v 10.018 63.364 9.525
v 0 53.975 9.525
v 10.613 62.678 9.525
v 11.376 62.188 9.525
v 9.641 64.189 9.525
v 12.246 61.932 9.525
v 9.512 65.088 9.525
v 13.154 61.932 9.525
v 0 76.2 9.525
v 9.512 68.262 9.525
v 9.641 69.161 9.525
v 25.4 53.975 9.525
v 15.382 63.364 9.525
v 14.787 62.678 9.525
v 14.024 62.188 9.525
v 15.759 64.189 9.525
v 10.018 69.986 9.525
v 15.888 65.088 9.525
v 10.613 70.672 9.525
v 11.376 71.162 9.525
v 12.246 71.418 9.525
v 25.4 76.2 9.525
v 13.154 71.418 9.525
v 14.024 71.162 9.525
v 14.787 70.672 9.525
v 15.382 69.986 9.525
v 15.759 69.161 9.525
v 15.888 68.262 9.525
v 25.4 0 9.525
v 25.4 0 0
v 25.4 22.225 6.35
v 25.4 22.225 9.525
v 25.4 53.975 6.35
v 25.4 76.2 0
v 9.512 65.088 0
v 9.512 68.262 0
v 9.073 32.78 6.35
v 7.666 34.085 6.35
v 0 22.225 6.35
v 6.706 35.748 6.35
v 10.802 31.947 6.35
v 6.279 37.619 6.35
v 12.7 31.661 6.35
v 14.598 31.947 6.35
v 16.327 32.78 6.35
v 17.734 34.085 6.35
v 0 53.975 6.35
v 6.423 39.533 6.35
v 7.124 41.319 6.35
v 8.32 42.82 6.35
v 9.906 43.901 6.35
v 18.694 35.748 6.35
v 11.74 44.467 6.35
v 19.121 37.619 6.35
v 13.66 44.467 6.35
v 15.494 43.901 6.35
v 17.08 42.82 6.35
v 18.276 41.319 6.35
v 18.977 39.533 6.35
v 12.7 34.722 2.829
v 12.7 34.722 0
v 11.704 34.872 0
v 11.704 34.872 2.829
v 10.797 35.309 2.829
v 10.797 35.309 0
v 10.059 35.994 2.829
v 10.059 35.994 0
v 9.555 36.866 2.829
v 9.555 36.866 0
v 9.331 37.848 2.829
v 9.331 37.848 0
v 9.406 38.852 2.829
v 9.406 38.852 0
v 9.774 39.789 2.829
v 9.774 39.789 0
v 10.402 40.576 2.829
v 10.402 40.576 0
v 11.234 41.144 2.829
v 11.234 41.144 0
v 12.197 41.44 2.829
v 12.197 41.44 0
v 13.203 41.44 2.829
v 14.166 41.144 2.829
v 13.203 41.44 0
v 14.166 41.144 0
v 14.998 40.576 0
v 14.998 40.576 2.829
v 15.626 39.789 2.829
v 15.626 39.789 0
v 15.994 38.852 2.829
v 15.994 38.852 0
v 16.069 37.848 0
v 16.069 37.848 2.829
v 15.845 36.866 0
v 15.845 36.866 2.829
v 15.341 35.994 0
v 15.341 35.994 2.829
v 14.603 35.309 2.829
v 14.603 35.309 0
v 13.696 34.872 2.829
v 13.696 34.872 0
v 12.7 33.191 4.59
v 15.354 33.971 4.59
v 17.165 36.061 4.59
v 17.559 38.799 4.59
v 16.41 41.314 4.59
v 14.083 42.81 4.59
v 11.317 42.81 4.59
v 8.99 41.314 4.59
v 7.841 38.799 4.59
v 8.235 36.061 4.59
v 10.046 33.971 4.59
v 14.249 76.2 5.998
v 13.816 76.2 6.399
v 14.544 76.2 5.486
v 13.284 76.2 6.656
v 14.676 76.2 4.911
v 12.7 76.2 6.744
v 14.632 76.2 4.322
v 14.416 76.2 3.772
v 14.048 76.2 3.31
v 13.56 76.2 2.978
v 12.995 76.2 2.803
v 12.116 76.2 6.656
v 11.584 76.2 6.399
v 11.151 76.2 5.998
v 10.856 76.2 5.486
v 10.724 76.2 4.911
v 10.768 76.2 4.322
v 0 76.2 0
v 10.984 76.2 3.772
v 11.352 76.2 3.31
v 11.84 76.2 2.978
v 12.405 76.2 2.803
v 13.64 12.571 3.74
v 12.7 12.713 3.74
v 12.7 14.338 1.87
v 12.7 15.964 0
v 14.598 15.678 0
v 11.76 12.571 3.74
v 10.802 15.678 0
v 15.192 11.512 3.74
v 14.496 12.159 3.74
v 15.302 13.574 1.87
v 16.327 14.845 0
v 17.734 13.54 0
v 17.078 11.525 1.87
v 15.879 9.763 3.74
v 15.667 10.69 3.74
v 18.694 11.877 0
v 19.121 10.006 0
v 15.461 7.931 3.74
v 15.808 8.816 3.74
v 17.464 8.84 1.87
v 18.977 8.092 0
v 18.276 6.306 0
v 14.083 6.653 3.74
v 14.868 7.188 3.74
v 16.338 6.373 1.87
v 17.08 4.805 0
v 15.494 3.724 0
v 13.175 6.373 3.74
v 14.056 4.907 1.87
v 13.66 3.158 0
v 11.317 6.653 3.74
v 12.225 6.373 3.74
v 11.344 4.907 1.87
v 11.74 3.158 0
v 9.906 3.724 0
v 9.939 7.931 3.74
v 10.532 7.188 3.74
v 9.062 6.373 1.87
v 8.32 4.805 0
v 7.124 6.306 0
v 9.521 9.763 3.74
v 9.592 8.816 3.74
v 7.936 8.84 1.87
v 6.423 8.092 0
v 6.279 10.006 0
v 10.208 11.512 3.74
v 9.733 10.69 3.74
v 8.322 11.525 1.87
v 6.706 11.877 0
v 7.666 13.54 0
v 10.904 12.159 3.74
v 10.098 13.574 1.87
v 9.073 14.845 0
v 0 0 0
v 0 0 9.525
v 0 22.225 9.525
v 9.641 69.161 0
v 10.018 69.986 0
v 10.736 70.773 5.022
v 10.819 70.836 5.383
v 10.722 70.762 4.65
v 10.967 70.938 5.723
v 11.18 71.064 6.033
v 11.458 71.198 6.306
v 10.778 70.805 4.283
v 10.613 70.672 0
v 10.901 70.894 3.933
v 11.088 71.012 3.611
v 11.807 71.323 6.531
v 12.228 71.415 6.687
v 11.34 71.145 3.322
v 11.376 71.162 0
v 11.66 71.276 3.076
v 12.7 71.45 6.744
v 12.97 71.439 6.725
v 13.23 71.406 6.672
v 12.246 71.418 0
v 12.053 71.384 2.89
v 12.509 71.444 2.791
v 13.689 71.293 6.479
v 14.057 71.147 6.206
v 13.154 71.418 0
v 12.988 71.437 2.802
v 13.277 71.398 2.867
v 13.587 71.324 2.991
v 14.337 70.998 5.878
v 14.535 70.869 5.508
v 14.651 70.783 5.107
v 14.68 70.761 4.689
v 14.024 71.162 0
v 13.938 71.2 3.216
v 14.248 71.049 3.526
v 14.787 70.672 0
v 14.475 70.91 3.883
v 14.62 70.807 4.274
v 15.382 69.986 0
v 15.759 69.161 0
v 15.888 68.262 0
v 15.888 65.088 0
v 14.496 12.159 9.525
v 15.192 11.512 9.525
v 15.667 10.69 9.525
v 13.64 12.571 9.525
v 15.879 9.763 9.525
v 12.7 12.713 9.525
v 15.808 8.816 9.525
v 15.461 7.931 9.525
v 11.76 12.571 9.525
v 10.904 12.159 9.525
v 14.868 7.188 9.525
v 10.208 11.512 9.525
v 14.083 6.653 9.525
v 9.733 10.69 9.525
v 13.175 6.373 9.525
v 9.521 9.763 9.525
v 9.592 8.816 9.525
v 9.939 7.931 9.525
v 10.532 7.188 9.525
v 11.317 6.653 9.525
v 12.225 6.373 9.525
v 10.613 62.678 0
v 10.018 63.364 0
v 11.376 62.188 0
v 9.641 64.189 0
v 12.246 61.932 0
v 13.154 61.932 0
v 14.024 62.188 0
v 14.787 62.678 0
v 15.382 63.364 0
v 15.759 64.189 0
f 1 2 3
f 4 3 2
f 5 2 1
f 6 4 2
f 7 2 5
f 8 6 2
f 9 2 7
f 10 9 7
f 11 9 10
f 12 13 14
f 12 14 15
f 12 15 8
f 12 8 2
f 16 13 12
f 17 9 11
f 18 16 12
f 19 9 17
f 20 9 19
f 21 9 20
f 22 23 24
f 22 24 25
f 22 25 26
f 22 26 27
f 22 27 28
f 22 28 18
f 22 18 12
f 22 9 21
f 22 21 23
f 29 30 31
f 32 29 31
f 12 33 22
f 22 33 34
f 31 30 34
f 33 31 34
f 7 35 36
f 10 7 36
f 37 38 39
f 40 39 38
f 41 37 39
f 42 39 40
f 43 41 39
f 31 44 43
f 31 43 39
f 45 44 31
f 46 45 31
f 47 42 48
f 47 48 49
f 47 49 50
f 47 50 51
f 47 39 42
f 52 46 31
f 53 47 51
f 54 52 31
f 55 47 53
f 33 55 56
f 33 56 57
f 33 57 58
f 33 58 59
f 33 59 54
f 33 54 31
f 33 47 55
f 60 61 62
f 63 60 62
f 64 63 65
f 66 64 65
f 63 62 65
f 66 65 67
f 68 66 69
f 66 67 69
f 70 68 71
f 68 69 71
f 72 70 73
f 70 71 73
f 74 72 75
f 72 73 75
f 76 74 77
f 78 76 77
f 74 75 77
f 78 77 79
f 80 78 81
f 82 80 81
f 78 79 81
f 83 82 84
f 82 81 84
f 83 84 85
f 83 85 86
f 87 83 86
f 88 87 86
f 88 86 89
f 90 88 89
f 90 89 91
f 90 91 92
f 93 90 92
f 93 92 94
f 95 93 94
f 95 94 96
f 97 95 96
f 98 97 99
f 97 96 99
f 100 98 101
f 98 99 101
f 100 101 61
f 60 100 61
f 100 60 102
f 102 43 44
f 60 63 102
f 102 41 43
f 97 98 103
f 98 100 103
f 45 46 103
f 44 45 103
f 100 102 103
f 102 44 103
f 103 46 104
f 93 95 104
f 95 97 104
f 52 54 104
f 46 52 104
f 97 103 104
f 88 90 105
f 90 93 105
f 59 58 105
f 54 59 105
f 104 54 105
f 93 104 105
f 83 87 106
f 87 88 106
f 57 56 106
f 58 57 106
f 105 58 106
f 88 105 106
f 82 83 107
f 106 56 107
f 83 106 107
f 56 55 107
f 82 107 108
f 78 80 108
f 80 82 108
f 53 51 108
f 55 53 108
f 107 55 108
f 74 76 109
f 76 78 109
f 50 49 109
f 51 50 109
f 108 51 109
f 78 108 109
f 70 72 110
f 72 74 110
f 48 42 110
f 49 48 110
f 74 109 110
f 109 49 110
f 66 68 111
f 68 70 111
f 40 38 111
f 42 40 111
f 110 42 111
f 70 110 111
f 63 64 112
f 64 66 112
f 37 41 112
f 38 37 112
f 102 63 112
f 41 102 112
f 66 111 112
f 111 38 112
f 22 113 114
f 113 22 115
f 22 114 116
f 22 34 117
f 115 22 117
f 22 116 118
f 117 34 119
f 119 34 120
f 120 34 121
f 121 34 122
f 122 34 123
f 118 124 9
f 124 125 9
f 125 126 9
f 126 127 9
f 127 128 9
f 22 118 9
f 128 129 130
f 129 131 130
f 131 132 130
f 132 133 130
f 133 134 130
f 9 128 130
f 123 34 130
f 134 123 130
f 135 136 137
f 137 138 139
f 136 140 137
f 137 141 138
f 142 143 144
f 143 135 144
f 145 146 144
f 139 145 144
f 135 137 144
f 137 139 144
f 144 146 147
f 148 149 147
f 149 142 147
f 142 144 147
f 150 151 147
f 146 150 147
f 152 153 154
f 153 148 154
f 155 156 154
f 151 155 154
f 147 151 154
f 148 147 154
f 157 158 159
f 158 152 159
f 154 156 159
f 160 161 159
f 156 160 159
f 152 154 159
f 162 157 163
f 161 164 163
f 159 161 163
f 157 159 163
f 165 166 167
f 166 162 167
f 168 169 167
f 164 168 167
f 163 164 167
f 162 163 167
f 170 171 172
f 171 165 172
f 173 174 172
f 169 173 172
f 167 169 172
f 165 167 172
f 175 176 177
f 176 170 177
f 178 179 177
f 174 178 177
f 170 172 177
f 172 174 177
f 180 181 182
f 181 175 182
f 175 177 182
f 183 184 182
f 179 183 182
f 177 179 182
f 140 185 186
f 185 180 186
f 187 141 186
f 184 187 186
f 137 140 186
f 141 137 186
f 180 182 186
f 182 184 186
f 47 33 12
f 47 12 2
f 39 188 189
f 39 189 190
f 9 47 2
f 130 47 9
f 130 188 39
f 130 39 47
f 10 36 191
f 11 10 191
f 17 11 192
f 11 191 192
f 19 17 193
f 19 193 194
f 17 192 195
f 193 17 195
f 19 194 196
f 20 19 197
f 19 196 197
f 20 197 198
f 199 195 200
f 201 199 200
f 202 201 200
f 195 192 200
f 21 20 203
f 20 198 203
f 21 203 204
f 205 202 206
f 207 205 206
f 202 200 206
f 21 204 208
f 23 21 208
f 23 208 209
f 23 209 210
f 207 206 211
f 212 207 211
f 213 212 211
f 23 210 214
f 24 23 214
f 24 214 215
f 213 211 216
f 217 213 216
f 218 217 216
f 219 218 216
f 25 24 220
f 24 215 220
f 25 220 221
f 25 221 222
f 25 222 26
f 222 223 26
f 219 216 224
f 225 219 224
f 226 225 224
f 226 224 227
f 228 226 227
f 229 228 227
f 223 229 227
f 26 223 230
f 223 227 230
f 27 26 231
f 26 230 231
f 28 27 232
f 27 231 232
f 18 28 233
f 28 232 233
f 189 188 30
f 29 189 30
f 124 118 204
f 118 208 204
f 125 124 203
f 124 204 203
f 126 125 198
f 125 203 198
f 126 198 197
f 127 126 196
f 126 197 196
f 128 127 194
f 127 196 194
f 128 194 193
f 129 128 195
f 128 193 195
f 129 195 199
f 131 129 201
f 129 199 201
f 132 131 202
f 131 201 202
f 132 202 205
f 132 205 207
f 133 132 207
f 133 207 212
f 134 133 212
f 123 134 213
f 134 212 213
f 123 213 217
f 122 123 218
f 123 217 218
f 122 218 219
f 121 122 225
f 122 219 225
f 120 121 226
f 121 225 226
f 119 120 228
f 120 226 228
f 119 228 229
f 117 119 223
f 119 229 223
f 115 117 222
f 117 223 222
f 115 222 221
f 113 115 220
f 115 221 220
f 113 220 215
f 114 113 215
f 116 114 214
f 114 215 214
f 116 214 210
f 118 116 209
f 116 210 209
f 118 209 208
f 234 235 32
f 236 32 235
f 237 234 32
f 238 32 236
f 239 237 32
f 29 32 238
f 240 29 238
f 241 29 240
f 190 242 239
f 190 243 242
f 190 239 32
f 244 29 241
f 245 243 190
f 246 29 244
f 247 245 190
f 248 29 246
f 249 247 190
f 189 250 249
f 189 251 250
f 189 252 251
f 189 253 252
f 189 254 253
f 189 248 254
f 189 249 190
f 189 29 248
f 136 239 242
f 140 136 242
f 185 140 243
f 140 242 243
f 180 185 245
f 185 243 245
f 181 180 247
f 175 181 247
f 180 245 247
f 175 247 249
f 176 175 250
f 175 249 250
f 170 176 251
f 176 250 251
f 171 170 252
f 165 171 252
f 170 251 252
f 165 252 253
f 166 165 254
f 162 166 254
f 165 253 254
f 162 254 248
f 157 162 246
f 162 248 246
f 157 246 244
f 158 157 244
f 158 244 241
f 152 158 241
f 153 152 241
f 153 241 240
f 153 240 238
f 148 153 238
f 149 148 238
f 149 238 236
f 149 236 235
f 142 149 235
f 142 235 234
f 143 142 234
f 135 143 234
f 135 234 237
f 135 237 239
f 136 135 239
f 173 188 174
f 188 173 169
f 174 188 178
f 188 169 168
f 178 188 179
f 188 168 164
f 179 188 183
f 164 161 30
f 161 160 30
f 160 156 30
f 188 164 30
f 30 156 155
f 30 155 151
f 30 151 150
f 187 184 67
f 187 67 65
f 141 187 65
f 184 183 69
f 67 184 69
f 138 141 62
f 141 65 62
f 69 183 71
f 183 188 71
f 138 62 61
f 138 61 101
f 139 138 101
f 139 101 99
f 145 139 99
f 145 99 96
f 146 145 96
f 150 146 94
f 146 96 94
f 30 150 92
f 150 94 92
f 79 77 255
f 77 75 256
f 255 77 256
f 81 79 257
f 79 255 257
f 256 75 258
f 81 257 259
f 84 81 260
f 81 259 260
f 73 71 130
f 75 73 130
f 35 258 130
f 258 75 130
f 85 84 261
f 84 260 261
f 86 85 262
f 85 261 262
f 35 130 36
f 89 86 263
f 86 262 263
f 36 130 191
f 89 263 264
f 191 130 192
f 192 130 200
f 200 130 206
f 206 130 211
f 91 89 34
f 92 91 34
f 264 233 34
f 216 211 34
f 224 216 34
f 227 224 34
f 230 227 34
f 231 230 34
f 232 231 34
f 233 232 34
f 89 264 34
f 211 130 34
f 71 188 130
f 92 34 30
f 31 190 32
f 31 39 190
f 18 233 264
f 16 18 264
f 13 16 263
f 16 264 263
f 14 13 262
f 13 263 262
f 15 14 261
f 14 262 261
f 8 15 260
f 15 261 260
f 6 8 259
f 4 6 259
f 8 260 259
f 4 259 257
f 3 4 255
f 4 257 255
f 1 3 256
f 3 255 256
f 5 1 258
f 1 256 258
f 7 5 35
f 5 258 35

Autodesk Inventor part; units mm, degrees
ref_plane "YZ Plane" through (0, 0, 0) normal (1, 0, 0) x (0, 1, 0)
ref_plane "XY Plane" through (0, 0, 0) normal (0, 0, 1) x (1, 0, 0)
sketch "Sketch1" plane through (0, 0, 0) normal (0, 0, 1) x (1, 0, 0)
  line L0 (0, 0) -> (25.4, 0)
  line L1 (25.4, 0) -> (25.4, 76.2)
  line L2 (25.4, 76.2) -> (0, 76.2)
  line L3 (0, 76.2) -> (0, 0)
  dimension "d0" = 76.2
  dimension "d1" = 25.4
extrude "Extrusion1" add sketch "Sketch1" along normal blind 6.35
sketch "Sketch2" plane through (0, 0, 6.35) normal (0, 0, 1) x (1, 0, 0)
  line L0 (25.4, 76.2) -> (0, 76.2) projected
  line L1 (25.4, 0) -> (25.4, 76.2) projected
  line L2 (0, 76.2) -> (25.4, 76.2)
  line L3 (25.4, 76.2) -> (25.4, 53.975)
  line L4 (25.4, 53.975) -> (0, 53.975)
  line L5 (0, 53.975) -> (0, 76.2)
  line L6 (0, 0) -> (25.4, 0) projected
  dimension "d4" = 22.225
extrude "Extrusion2" add sketch "Sketch2" along normal blind 3.175
ref_plane "Work Plane1" through (0, 38.1, 0) normal (0, 1, 0) x (-1, 0, 0)
mirror "Mirror1" about plane through (0, 38.1, 0) normal (0, 1, 0) of "Extrusion2"
sketch "Sketch6" plane through (0, 0, 0) normal (0, 0, 1) x (1, 0, 0)
  line L0 (25.4, 76.2) -> (0, 76.2) projected
  line L1 (25.4, 53.975) -> (25.4, 76.2) projected
  line L2 (25.4, 0) -> (0, 0) projected
  line L3 (0, 22.225) -> (25.4, 22.225) projected
  line L4 (25.4, 22.225) -> (25.4, 0) projected
  point P0 (12.7, 9.525)
  dimension "d28" = 12.7
  dimension "d29" = 12.7
sketch "Sketch7" plane through (0, 0, 6.35) normal (0, 0, 1) x (1, 0, 0)
  line L0 (0, 53.975) -> (25.4, 53.975) projected
  line L1 (0, 53.975) -> (0, 22.225) projected
  line L2 (25.4, 0) -> (25.4, 76.2) projected
  point P0 (0, 0)
  point P1 (12.7, 38.1)
  point P2 (25.4, 38.1)
  dimension "d38" = 12.7
hole "Hole3" at (12.7, 38.1, 6.35) direction (0, 0, -1) diameter 6.7564 end through all countersink diameter 12.8778 countersink angle 82 clearance for "Flat Head Machine Screw (82)" size "1/4" standard "Ansi Unified Screw Threads"
hole "Hole4" at (12.7, 9.525, 0) direction (0, 0, 1) diameter 6.3754 end through all countersink diameter 12.8778 countersink angle 82 clearance for "Flat Head Machine Screw (82)" size "1/4" standard "Ansi Unified Screw Threads"
sketch "Sketch8" plane through (0, 0, 0) normal (0, 0, -1) x (-1, 0, 0)
  line L0 (-12.7, 68.2625) -> (-12.7, 65.0875) construction
  line L1 (-15.8877, 68.2625) -> (-15.8877, 65.0875)
  line L2 (-9.5123, 65.0875) -> (-9.5123, 68.2625)
  arc A0 (-9.5123, 68.2625) -> (-15.8877, 68.2625) centre (-12.7, 68.2625) ccw
  arc A1 (-15.8877, 65.0875) -> (-9.5123, 65.0875) centre (-12.7, 65.0875) ccw
  circle A2 centre (-12.7, 9.525) radius 6.4389 projected
  point P0 (-12.7, 66.675)
  point P1 (-12.7, 66.675)
  dimension "d54" = 3.175
  dimension "d67" = 57.15
  dimension "d68" = 6.3754
extrude "Extrusion3" cut sketch "Sketch8" against normal through all contours A0 L2 A1 L1
sketch "Sketch10" plane through (0, 76.2, 0) normal (0, 1, 0) x (1, 0, 0)
  line L0 (0, 0) -> (0, -9.525) projected
  line L1 (25.4, 0) -> (0, 0) projected
  point P0 (12.7, -4.7625)
  point P1 (0, -4.7625)
  point P2 (12.7, 0)
hole "Hole5" at (12.7, 76.2, 4.7625) direction (0, -1, 0) diameter 3.9624 depth 9.525 tip angle 118 thread size "10-32 UNF" class "2B" standard "ANSI Unified Screw Threads"
properties part number "RollerBracket" material "Aluminum 6061"
